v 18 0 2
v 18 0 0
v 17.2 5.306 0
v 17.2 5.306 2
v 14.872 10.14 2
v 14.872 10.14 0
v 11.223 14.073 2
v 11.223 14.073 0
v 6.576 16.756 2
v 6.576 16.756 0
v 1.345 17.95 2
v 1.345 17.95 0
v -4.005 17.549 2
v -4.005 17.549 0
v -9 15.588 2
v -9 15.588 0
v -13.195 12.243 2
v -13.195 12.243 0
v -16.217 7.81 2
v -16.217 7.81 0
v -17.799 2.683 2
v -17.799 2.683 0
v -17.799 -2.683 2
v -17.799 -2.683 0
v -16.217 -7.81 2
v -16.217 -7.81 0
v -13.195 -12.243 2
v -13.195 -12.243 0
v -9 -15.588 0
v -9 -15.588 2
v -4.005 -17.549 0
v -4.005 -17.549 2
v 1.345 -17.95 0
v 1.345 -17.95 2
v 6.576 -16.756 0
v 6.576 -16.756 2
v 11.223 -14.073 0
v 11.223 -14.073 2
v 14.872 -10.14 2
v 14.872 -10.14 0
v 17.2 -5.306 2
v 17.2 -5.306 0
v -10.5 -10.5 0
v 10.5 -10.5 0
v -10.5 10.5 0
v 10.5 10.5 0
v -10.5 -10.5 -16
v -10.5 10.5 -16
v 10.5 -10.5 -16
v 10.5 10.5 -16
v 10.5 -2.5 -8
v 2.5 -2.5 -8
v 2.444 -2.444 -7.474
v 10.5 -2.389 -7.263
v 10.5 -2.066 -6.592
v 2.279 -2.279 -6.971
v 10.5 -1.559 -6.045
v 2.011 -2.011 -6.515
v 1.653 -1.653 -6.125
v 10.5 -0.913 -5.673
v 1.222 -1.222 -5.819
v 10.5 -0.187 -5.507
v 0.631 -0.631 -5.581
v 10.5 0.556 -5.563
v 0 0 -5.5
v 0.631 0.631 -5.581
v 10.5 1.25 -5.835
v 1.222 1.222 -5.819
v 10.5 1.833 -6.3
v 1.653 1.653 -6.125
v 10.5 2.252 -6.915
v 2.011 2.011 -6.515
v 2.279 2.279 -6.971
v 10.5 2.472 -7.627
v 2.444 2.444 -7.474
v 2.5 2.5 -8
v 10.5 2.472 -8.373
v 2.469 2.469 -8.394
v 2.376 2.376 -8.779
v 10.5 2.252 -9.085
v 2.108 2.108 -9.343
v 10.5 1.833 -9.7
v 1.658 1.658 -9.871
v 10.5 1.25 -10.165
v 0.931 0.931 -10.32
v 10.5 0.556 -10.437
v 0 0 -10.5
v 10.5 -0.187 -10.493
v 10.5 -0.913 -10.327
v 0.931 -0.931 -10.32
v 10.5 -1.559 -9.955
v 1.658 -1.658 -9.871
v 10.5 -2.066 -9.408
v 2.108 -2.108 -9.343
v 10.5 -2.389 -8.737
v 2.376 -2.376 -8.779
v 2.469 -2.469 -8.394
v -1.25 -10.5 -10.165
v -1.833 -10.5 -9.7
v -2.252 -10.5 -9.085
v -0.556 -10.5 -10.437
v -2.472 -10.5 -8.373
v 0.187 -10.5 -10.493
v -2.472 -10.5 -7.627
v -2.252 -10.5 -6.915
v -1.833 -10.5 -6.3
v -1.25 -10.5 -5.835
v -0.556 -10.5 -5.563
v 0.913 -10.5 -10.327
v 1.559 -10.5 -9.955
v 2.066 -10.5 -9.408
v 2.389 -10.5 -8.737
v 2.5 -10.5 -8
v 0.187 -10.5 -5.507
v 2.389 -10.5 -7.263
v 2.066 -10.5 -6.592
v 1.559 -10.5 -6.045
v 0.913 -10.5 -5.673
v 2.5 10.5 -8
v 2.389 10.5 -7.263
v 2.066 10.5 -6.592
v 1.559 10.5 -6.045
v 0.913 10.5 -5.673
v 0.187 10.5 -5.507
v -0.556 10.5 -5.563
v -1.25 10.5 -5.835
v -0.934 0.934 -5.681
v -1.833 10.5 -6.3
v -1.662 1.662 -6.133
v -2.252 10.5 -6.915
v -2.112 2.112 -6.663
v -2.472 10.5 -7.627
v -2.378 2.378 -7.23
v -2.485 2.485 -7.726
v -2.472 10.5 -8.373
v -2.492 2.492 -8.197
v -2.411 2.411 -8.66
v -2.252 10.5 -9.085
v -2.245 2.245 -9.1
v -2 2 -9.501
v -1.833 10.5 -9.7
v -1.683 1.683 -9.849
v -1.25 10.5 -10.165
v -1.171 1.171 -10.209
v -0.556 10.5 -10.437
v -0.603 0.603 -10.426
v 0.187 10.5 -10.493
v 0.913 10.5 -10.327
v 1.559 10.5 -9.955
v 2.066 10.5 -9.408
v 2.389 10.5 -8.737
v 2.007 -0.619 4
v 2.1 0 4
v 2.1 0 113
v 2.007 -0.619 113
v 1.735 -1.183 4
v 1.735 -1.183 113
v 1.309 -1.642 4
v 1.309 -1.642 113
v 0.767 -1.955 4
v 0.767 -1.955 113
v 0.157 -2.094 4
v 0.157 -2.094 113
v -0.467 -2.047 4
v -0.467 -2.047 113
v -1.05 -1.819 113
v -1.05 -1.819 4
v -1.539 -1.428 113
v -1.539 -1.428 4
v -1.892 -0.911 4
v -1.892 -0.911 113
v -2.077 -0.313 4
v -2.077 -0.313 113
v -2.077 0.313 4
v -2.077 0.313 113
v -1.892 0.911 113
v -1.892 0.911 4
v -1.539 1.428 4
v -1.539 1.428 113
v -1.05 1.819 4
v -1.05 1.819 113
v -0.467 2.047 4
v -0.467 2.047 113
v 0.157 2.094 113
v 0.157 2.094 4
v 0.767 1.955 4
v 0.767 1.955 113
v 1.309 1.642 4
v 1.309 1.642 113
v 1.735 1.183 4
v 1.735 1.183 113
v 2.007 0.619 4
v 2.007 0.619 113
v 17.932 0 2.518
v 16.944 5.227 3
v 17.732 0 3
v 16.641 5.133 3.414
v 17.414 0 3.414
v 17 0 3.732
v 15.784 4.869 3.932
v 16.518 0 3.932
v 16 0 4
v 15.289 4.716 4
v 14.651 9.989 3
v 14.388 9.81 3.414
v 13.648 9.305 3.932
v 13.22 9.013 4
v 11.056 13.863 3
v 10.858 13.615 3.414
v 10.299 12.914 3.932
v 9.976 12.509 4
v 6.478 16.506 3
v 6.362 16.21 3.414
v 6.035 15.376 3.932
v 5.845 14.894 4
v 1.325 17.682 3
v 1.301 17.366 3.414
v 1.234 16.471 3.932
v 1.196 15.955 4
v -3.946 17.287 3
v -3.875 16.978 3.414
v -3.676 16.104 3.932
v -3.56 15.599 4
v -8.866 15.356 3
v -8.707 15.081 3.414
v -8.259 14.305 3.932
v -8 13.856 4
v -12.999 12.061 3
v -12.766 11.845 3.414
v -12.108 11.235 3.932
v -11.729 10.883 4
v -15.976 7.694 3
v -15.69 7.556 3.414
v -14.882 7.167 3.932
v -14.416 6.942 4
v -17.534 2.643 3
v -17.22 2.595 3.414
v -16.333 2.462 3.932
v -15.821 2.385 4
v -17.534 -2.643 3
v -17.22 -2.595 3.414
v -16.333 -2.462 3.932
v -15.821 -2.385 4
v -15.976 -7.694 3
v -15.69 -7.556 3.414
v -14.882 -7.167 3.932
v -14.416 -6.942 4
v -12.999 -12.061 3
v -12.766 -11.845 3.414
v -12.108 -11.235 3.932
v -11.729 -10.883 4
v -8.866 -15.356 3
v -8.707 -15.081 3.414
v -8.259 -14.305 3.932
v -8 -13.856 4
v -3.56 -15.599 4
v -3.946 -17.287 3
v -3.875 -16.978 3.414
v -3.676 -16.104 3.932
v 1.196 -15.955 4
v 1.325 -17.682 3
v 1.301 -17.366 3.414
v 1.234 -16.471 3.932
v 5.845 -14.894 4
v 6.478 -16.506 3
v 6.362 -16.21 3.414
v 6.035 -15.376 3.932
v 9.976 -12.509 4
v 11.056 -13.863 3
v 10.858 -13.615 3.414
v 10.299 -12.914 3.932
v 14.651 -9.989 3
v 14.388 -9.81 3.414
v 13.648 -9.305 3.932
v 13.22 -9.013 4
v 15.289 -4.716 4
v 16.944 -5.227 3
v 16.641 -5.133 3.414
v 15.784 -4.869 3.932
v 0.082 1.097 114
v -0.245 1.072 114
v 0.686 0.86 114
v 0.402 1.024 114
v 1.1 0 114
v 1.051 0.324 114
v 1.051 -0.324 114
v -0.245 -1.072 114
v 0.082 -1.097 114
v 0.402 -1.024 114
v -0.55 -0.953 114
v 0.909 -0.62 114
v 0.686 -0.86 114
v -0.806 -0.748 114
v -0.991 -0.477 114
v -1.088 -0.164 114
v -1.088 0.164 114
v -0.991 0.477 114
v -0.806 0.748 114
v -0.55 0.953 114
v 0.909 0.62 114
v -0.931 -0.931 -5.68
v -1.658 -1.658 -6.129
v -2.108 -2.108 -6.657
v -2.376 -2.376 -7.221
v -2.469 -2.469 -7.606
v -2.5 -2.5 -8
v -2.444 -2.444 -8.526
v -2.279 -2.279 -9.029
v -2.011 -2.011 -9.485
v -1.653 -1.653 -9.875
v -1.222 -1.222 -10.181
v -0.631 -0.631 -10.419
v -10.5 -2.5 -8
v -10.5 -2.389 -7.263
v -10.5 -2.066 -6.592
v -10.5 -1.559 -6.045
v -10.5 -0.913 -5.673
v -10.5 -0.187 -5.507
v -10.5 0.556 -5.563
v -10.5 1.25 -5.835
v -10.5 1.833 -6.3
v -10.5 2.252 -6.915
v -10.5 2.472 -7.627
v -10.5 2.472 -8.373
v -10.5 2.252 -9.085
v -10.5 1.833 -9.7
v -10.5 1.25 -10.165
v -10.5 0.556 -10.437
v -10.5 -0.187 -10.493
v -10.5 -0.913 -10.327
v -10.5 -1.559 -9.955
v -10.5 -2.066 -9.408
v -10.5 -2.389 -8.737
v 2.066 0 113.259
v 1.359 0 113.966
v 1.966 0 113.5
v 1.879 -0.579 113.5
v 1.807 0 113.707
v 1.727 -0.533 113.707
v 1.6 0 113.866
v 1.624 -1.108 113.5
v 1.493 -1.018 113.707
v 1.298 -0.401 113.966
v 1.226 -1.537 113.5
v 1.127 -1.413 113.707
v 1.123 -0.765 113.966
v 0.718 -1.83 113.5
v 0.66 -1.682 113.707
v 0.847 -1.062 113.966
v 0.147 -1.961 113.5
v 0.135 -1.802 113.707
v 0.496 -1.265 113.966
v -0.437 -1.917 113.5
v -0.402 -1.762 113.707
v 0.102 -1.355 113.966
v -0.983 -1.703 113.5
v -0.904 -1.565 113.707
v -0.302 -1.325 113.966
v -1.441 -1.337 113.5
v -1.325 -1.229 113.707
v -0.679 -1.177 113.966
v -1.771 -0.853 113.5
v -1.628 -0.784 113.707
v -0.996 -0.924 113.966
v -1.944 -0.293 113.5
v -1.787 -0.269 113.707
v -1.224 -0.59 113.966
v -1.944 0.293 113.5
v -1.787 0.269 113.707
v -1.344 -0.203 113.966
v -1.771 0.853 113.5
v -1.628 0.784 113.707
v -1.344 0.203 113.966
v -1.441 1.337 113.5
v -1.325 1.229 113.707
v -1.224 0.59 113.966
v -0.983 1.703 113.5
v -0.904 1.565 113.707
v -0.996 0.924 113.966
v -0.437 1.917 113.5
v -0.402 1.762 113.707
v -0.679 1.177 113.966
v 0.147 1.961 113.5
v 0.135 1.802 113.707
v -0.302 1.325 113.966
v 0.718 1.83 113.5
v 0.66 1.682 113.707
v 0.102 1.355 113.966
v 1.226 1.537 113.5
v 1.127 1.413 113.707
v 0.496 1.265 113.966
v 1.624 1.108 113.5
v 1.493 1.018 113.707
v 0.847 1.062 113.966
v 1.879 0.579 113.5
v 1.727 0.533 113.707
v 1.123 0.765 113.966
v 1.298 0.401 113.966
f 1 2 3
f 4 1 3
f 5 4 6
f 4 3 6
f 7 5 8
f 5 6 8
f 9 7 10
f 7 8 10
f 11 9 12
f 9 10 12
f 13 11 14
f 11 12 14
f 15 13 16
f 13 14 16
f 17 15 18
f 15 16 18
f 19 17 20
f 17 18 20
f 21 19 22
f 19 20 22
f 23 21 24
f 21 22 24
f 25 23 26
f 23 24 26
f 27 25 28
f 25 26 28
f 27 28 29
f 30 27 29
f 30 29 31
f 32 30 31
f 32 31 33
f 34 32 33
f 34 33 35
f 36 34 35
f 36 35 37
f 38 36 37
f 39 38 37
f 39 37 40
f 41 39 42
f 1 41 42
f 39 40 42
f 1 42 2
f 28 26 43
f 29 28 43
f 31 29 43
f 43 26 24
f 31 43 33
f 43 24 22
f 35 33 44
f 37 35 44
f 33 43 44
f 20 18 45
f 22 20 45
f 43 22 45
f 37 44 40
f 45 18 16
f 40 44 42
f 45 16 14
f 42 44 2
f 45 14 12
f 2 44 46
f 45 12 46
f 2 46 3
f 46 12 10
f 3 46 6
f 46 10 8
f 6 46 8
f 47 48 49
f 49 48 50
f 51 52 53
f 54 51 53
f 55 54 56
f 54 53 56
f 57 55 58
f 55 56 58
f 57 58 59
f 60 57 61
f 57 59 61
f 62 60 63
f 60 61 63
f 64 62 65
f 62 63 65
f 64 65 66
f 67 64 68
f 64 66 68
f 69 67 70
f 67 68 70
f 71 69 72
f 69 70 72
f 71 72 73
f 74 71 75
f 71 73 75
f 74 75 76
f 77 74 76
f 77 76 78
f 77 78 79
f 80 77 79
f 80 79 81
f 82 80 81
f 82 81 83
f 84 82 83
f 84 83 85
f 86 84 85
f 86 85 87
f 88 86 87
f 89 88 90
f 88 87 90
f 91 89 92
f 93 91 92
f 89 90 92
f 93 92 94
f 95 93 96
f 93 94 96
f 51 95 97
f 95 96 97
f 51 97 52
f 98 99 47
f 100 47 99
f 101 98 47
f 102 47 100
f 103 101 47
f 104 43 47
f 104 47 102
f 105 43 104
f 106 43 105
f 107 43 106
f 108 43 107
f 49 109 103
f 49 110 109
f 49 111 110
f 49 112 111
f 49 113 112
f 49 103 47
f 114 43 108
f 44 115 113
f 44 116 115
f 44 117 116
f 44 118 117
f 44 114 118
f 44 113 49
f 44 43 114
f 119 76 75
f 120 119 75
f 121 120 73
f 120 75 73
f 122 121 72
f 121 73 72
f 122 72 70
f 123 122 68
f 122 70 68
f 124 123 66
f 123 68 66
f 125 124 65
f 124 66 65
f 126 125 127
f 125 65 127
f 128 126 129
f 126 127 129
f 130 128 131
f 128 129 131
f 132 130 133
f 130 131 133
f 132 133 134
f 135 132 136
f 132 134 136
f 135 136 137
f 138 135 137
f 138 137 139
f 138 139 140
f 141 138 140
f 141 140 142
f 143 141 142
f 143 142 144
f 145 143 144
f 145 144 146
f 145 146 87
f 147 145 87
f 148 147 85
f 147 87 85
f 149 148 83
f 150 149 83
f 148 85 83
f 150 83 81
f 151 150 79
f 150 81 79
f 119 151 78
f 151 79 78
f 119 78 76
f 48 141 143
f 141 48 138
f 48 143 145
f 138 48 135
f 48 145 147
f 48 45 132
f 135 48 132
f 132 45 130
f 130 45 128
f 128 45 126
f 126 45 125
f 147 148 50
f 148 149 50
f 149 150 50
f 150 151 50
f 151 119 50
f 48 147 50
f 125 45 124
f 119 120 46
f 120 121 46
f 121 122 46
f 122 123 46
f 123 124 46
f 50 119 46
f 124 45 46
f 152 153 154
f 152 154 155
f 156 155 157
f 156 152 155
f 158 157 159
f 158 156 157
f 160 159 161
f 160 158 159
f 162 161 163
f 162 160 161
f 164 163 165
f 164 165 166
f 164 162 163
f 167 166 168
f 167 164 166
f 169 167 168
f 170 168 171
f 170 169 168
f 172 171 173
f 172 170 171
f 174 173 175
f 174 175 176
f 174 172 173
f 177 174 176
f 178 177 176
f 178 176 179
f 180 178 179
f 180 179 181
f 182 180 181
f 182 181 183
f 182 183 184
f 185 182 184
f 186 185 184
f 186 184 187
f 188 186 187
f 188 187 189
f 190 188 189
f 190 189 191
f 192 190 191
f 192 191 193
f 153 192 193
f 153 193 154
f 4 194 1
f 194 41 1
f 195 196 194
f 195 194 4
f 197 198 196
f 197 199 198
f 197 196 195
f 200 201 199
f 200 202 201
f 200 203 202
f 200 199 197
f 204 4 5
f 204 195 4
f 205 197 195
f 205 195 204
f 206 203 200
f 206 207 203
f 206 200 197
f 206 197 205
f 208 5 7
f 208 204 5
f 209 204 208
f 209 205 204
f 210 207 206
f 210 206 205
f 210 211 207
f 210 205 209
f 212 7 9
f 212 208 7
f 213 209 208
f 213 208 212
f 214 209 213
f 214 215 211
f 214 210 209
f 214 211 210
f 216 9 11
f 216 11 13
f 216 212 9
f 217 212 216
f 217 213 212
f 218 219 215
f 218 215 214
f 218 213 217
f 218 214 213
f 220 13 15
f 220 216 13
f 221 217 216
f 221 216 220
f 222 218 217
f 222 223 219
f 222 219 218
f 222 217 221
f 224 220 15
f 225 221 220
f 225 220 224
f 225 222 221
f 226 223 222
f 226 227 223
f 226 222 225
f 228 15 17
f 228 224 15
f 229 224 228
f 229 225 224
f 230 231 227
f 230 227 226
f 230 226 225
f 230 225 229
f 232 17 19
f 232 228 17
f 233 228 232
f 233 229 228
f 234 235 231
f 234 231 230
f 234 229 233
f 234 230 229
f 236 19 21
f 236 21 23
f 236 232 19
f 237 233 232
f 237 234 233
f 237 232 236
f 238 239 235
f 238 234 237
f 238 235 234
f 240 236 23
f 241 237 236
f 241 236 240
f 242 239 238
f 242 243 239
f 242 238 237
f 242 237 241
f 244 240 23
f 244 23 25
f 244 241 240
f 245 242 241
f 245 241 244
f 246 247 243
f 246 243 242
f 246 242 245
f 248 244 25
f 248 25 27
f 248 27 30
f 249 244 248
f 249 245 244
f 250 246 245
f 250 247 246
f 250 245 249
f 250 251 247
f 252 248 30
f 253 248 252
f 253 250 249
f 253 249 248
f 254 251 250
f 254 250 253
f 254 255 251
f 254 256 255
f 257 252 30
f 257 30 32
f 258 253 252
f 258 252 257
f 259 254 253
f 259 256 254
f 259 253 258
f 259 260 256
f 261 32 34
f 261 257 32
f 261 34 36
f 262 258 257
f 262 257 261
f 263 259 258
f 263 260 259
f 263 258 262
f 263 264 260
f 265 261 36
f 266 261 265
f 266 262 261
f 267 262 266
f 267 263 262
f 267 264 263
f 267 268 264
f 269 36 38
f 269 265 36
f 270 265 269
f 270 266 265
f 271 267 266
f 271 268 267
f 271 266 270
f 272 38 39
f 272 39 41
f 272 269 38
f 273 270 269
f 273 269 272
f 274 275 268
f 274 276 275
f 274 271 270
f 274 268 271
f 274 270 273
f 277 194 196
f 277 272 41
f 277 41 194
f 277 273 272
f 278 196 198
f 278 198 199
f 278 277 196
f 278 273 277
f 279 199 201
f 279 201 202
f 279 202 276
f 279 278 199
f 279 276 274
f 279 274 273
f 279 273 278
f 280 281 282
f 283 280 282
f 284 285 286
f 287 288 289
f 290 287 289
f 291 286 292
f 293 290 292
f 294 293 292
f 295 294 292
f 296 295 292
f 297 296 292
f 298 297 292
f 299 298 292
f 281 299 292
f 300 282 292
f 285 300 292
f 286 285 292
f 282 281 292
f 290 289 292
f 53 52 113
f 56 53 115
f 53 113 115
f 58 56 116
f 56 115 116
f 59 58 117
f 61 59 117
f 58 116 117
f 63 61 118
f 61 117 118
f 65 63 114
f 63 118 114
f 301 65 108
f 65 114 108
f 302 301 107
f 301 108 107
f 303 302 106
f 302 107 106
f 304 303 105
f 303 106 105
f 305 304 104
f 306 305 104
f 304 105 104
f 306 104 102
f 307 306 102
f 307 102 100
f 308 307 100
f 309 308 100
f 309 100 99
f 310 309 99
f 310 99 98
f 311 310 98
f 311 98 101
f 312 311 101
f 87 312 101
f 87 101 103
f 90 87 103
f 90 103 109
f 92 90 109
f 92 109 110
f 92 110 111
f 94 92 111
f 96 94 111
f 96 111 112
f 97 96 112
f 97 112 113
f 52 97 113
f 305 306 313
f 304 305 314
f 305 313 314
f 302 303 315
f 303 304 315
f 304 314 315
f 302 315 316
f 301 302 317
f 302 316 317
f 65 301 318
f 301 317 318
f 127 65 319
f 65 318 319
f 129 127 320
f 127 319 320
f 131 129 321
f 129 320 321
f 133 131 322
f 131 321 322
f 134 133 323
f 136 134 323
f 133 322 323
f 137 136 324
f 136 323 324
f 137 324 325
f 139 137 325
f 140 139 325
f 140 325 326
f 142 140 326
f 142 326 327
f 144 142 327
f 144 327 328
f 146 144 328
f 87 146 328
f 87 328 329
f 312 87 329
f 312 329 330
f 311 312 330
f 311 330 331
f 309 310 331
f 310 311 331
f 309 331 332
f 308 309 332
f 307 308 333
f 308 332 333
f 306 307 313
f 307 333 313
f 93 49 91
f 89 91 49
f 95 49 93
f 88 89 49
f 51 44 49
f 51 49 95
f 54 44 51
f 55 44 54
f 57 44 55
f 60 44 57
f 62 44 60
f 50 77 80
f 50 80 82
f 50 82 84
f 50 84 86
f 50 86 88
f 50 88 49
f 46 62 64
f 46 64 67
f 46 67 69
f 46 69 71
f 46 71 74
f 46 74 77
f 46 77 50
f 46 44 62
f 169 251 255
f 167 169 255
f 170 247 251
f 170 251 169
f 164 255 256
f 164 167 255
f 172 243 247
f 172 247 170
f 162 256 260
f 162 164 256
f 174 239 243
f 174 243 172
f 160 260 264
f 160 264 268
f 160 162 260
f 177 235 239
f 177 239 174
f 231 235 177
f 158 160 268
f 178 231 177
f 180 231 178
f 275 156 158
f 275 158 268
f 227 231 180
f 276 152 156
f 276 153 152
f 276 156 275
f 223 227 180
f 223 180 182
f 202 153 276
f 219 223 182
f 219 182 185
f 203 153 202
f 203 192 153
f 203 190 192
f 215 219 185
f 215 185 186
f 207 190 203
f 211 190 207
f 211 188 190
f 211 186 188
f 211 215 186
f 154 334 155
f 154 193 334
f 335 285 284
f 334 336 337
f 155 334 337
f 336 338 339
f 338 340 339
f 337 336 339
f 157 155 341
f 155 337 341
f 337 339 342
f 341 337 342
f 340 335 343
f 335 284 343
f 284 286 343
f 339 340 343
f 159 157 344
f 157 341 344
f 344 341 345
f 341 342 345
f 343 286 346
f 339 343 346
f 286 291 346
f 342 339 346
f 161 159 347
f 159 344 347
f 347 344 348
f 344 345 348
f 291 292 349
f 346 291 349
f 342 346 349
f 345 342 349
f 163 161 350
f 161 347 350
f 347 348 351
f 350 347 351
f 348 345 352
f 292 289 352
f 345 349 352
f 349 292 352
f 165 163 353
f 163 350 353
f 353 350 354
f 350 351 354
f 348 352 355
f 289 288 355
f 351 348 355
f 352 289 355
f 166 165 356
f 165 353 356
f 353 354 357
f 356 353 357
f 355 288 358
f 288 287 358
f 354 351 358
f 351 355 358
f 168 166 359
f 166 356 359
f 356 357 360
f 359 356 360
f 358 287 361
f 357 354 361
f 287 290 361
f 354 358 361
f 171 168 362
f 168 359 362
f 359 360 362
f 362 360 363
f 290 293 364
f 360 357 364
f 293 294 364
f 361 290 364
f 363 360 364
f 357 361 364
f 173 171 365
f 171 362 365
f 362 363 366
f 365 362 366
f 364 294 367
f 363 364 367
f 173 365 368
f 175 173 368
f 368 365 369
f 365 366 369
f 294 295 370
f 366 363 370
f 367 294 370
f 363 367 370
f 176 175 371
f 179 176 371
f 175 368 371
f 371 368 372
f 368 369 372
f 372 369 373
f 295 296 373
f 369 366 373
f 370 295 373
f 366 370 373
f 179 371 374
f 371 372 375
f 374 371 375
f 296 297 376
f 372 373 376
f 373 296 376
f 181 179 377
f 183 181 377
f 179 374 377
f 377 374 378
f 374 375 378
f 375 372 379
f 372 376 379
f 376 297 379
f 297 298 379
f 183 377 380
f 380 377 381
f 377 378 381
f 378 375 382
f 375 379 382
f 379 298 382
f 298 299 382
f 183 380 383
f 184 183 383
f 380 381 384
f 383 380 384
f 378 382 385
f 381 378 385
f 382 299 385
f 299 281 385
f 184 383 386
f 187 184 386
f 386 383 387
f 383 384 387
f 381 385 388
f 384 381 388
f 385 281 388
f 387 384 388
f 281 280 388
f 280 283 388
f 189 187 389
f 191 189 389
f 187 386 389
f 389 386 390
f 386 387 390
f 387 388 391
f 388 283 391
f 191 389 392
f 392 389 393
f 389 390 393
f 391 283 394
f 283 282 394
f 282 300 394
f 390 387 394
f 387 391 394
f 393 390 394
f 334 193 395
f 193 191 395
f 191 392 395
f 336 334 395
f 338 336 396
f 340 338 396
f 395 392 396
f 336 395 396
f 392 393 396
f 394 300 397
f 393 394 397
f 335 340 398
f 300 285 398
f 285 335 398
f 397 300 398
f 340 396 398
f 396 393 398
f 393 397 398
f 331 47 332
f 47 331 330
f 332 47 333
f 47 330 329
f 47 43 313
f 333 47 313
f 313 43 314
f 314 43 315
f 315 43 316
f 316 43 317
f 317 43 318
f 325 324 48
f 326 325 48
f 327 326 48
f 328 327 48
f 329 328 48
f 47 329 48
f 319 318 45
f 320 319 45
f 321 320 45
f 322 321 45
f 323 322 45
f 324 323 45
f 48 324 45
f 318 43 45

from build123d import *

# Parameters (mm, degrees)
F0_R      = 18
F1_DEPTH  = 4
F2_W      = 21
F2_H      = 21
F3_DEPTH  = 16
F4_R      = 2.1
F5_DEPTH  = 20.001
F6_R      = 2
F7_R      = 2.1
F8_DEPTH  = 130
F9_R      = 1
F10_R     = 2.5
F11_DEPTH = 25
F12_R     = 2.5
F13_DEPTH = 25


with BuildPart() as f1:
    # F0 (on Top) → F1 (new body)
    with BuildSketch(Plane.XY):
        Circle(F0_R)
    extrude(amount=F1_DEPTH)

    # F2 (on Top) → F3 (join)
    with BuildSketch(Plane.XY):
        Rectangle(F2_W, F2_H)
    extrude(amount=-F3_DEPTH)

    # F4 (on face) → F5 (cut, through all)
    with BuildSketch(Plane.XY.offset(4)):
        Circle(F4_R)
    extrude(amount=-F5_DEPTH, mode=Mode.SUBTRACT)

    # F6
    f6_edges = [f1.edges().sort_by_distance(p)[0] for p in [
        (-18, 0, 4),
    ]]
    fillet(f6_edges, radius=F6_R)

    # F7 (on face) → F8 (join)
    with BuildSketch(Plane(origin=(0, 0, -16), x_dir=(1, 0, 0), z_dir=(0, 0, -1))):
        Circle(F7_R)
    extrude(amount=-F8_DEPTH)

    # F9
    f9_edges = [f1.edges().sort_by_distance(p)[0] for p in [
        (-2.1, 0, 114),
    ]]
    fillet(f9_edges, radius=F9_R)

    # F10 (on face) → F11 (cut)
    with BuildSketch(Plane.XZ.offset(10.5)):
        with Locations((0, -8)):
            Circle(F10_R)
    extrude(amount=-F11_DEPTH, mode=Mode.SUBTRACT)

    # F12 (on face) → F13 (cut)
    with BuildSketch(Plane(origin=(-10.5, 0, 0), x_dir=(0, -1, 0), z_dir=(-1, 0, 0))):
        with Locations((0, -8)):
            Circle(F12_R)
    extrude(amount=-F13_DEPTH, mode=Mode.SUBTRACT)


solid = f1.part
